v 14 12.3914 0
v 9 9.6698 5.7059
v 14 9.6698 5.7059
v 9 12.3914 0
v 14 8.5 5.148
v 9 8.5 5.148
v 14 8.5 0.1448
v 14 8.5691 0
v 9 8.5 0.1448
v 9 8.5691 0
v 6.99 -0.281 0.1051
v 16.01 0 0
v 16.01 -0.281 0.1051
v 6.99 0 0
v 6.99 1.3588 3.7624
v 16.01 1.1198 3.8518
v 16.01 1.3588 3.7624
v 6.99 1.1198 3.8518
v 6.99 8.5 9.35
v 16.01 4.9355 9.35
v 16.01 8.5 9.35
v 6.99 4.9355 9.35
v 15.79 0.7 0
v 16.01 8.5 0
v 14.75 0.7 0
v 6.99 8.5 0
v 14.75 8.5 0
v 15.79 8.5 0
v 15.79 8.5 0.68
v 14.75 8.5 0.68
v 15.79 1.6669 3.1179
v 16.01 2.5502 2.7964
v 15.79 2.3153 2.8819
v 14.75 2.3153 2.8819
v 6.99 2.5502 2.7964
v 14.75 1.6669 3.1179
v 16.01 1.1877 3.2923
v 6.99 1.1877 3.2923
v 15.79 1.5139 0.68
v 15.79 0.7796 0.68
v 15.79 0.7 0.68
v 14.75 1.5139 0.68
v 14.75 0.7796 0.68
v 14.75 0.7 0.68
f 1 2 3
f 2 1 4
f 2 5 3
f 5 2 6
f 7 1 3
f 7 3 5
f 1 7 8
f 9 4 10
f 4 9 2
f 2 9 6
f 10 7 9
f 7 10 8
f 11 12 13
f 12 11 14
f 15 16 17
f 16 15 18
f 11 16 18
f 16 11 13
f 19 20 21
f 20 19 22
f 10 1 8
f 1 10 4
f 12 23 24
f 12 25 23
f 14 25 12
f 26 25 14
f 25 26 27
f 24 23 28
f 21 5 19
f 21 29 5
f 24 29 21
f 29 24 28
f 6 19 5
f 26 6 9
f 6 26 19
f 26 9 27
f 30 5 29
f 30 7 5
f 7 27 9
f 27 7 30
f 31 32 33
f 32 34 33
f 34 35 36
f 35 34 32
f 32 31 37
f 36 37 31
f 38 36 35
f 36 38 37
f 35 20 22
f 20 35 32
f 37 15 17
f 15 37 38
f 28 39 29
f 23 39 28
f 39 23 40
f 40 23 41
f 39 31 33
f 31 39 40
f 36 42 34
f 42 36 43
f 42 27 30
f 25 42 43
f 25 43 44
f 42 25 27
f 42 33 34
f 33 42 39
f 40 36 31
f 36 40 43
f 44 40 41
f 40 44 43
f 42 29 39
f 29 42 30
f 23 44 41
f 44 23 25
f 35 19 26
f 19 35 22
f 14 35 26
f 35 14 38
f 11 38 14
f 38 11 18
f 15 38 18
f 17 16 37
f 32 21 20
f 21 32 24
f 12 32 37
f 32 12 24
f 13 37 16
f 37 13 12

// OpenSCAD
// tablet 
// width: 18.5cm
// depth: 0.95cm
// length: 26.5cm
tab_w = 18.5 + 0.5;
tab_d = 0.95 + 0.5;
tab_l = 26.5;

usb_l = 2.85;
usb_w = 1.04;
usb_d = 0.69;

usb_offset_w = 12.5 + 4/2 + 0.25; // bis ca. 13.5

difference(){
    
    union(){
        rotate([-20.5,0,0])
        cube([tab_w+4,  tab_d + 2, 10]);
        
        // stützen
        translate([0,10,-3])
        rotate([25.5, 0,0])
        cube([5, tab_d + 2, 8]);
        
        translate([tab_w-1, 10,-3])
        rotate([25.5, 0,0])
        cube([5, tab_d + 2, 8]);

        translate([tab_w/2-0.5, 10,-3])
        rotate([25.5, 0,0])
        cube([5, tab_d + 2, 8]);
        
        rotate([-20.5,0,0])
        translate([0,-0.3,0])
        cube([tab_w+4,  tab_d + 2, 4]);     
        
        // back-base
        translate([0,3.5,0])
        cube([tab_w+4, 5, 9.35]);
    }
    
    rotate([-20,0,0])
    translate([2,-0.01,3.5])
    #cube([tab_w, tab_d, tab_l]);
    
    translate([-.5,0,-3])
    cube([tab_w+5, 15, 3]);
    
    // usb
    rotate([-20,0,0])
    translate([usb_offset_w,0.5,0.7])
    cube([usb_w, usb_d, usb_l]);
    
    translate([usb_offset_w, 0.7, -0.01])
    cube([usb_w, 10, usb_d]);
    
    // cut off the sides to fit it in 10cm
    translate([-0.01-3, -2, -0.01])
    cube([10,100,100]);
    
    translate([tab_w+4-10+0.01+3, -2, -0.01])
    cube([10,100,100]);    
}
